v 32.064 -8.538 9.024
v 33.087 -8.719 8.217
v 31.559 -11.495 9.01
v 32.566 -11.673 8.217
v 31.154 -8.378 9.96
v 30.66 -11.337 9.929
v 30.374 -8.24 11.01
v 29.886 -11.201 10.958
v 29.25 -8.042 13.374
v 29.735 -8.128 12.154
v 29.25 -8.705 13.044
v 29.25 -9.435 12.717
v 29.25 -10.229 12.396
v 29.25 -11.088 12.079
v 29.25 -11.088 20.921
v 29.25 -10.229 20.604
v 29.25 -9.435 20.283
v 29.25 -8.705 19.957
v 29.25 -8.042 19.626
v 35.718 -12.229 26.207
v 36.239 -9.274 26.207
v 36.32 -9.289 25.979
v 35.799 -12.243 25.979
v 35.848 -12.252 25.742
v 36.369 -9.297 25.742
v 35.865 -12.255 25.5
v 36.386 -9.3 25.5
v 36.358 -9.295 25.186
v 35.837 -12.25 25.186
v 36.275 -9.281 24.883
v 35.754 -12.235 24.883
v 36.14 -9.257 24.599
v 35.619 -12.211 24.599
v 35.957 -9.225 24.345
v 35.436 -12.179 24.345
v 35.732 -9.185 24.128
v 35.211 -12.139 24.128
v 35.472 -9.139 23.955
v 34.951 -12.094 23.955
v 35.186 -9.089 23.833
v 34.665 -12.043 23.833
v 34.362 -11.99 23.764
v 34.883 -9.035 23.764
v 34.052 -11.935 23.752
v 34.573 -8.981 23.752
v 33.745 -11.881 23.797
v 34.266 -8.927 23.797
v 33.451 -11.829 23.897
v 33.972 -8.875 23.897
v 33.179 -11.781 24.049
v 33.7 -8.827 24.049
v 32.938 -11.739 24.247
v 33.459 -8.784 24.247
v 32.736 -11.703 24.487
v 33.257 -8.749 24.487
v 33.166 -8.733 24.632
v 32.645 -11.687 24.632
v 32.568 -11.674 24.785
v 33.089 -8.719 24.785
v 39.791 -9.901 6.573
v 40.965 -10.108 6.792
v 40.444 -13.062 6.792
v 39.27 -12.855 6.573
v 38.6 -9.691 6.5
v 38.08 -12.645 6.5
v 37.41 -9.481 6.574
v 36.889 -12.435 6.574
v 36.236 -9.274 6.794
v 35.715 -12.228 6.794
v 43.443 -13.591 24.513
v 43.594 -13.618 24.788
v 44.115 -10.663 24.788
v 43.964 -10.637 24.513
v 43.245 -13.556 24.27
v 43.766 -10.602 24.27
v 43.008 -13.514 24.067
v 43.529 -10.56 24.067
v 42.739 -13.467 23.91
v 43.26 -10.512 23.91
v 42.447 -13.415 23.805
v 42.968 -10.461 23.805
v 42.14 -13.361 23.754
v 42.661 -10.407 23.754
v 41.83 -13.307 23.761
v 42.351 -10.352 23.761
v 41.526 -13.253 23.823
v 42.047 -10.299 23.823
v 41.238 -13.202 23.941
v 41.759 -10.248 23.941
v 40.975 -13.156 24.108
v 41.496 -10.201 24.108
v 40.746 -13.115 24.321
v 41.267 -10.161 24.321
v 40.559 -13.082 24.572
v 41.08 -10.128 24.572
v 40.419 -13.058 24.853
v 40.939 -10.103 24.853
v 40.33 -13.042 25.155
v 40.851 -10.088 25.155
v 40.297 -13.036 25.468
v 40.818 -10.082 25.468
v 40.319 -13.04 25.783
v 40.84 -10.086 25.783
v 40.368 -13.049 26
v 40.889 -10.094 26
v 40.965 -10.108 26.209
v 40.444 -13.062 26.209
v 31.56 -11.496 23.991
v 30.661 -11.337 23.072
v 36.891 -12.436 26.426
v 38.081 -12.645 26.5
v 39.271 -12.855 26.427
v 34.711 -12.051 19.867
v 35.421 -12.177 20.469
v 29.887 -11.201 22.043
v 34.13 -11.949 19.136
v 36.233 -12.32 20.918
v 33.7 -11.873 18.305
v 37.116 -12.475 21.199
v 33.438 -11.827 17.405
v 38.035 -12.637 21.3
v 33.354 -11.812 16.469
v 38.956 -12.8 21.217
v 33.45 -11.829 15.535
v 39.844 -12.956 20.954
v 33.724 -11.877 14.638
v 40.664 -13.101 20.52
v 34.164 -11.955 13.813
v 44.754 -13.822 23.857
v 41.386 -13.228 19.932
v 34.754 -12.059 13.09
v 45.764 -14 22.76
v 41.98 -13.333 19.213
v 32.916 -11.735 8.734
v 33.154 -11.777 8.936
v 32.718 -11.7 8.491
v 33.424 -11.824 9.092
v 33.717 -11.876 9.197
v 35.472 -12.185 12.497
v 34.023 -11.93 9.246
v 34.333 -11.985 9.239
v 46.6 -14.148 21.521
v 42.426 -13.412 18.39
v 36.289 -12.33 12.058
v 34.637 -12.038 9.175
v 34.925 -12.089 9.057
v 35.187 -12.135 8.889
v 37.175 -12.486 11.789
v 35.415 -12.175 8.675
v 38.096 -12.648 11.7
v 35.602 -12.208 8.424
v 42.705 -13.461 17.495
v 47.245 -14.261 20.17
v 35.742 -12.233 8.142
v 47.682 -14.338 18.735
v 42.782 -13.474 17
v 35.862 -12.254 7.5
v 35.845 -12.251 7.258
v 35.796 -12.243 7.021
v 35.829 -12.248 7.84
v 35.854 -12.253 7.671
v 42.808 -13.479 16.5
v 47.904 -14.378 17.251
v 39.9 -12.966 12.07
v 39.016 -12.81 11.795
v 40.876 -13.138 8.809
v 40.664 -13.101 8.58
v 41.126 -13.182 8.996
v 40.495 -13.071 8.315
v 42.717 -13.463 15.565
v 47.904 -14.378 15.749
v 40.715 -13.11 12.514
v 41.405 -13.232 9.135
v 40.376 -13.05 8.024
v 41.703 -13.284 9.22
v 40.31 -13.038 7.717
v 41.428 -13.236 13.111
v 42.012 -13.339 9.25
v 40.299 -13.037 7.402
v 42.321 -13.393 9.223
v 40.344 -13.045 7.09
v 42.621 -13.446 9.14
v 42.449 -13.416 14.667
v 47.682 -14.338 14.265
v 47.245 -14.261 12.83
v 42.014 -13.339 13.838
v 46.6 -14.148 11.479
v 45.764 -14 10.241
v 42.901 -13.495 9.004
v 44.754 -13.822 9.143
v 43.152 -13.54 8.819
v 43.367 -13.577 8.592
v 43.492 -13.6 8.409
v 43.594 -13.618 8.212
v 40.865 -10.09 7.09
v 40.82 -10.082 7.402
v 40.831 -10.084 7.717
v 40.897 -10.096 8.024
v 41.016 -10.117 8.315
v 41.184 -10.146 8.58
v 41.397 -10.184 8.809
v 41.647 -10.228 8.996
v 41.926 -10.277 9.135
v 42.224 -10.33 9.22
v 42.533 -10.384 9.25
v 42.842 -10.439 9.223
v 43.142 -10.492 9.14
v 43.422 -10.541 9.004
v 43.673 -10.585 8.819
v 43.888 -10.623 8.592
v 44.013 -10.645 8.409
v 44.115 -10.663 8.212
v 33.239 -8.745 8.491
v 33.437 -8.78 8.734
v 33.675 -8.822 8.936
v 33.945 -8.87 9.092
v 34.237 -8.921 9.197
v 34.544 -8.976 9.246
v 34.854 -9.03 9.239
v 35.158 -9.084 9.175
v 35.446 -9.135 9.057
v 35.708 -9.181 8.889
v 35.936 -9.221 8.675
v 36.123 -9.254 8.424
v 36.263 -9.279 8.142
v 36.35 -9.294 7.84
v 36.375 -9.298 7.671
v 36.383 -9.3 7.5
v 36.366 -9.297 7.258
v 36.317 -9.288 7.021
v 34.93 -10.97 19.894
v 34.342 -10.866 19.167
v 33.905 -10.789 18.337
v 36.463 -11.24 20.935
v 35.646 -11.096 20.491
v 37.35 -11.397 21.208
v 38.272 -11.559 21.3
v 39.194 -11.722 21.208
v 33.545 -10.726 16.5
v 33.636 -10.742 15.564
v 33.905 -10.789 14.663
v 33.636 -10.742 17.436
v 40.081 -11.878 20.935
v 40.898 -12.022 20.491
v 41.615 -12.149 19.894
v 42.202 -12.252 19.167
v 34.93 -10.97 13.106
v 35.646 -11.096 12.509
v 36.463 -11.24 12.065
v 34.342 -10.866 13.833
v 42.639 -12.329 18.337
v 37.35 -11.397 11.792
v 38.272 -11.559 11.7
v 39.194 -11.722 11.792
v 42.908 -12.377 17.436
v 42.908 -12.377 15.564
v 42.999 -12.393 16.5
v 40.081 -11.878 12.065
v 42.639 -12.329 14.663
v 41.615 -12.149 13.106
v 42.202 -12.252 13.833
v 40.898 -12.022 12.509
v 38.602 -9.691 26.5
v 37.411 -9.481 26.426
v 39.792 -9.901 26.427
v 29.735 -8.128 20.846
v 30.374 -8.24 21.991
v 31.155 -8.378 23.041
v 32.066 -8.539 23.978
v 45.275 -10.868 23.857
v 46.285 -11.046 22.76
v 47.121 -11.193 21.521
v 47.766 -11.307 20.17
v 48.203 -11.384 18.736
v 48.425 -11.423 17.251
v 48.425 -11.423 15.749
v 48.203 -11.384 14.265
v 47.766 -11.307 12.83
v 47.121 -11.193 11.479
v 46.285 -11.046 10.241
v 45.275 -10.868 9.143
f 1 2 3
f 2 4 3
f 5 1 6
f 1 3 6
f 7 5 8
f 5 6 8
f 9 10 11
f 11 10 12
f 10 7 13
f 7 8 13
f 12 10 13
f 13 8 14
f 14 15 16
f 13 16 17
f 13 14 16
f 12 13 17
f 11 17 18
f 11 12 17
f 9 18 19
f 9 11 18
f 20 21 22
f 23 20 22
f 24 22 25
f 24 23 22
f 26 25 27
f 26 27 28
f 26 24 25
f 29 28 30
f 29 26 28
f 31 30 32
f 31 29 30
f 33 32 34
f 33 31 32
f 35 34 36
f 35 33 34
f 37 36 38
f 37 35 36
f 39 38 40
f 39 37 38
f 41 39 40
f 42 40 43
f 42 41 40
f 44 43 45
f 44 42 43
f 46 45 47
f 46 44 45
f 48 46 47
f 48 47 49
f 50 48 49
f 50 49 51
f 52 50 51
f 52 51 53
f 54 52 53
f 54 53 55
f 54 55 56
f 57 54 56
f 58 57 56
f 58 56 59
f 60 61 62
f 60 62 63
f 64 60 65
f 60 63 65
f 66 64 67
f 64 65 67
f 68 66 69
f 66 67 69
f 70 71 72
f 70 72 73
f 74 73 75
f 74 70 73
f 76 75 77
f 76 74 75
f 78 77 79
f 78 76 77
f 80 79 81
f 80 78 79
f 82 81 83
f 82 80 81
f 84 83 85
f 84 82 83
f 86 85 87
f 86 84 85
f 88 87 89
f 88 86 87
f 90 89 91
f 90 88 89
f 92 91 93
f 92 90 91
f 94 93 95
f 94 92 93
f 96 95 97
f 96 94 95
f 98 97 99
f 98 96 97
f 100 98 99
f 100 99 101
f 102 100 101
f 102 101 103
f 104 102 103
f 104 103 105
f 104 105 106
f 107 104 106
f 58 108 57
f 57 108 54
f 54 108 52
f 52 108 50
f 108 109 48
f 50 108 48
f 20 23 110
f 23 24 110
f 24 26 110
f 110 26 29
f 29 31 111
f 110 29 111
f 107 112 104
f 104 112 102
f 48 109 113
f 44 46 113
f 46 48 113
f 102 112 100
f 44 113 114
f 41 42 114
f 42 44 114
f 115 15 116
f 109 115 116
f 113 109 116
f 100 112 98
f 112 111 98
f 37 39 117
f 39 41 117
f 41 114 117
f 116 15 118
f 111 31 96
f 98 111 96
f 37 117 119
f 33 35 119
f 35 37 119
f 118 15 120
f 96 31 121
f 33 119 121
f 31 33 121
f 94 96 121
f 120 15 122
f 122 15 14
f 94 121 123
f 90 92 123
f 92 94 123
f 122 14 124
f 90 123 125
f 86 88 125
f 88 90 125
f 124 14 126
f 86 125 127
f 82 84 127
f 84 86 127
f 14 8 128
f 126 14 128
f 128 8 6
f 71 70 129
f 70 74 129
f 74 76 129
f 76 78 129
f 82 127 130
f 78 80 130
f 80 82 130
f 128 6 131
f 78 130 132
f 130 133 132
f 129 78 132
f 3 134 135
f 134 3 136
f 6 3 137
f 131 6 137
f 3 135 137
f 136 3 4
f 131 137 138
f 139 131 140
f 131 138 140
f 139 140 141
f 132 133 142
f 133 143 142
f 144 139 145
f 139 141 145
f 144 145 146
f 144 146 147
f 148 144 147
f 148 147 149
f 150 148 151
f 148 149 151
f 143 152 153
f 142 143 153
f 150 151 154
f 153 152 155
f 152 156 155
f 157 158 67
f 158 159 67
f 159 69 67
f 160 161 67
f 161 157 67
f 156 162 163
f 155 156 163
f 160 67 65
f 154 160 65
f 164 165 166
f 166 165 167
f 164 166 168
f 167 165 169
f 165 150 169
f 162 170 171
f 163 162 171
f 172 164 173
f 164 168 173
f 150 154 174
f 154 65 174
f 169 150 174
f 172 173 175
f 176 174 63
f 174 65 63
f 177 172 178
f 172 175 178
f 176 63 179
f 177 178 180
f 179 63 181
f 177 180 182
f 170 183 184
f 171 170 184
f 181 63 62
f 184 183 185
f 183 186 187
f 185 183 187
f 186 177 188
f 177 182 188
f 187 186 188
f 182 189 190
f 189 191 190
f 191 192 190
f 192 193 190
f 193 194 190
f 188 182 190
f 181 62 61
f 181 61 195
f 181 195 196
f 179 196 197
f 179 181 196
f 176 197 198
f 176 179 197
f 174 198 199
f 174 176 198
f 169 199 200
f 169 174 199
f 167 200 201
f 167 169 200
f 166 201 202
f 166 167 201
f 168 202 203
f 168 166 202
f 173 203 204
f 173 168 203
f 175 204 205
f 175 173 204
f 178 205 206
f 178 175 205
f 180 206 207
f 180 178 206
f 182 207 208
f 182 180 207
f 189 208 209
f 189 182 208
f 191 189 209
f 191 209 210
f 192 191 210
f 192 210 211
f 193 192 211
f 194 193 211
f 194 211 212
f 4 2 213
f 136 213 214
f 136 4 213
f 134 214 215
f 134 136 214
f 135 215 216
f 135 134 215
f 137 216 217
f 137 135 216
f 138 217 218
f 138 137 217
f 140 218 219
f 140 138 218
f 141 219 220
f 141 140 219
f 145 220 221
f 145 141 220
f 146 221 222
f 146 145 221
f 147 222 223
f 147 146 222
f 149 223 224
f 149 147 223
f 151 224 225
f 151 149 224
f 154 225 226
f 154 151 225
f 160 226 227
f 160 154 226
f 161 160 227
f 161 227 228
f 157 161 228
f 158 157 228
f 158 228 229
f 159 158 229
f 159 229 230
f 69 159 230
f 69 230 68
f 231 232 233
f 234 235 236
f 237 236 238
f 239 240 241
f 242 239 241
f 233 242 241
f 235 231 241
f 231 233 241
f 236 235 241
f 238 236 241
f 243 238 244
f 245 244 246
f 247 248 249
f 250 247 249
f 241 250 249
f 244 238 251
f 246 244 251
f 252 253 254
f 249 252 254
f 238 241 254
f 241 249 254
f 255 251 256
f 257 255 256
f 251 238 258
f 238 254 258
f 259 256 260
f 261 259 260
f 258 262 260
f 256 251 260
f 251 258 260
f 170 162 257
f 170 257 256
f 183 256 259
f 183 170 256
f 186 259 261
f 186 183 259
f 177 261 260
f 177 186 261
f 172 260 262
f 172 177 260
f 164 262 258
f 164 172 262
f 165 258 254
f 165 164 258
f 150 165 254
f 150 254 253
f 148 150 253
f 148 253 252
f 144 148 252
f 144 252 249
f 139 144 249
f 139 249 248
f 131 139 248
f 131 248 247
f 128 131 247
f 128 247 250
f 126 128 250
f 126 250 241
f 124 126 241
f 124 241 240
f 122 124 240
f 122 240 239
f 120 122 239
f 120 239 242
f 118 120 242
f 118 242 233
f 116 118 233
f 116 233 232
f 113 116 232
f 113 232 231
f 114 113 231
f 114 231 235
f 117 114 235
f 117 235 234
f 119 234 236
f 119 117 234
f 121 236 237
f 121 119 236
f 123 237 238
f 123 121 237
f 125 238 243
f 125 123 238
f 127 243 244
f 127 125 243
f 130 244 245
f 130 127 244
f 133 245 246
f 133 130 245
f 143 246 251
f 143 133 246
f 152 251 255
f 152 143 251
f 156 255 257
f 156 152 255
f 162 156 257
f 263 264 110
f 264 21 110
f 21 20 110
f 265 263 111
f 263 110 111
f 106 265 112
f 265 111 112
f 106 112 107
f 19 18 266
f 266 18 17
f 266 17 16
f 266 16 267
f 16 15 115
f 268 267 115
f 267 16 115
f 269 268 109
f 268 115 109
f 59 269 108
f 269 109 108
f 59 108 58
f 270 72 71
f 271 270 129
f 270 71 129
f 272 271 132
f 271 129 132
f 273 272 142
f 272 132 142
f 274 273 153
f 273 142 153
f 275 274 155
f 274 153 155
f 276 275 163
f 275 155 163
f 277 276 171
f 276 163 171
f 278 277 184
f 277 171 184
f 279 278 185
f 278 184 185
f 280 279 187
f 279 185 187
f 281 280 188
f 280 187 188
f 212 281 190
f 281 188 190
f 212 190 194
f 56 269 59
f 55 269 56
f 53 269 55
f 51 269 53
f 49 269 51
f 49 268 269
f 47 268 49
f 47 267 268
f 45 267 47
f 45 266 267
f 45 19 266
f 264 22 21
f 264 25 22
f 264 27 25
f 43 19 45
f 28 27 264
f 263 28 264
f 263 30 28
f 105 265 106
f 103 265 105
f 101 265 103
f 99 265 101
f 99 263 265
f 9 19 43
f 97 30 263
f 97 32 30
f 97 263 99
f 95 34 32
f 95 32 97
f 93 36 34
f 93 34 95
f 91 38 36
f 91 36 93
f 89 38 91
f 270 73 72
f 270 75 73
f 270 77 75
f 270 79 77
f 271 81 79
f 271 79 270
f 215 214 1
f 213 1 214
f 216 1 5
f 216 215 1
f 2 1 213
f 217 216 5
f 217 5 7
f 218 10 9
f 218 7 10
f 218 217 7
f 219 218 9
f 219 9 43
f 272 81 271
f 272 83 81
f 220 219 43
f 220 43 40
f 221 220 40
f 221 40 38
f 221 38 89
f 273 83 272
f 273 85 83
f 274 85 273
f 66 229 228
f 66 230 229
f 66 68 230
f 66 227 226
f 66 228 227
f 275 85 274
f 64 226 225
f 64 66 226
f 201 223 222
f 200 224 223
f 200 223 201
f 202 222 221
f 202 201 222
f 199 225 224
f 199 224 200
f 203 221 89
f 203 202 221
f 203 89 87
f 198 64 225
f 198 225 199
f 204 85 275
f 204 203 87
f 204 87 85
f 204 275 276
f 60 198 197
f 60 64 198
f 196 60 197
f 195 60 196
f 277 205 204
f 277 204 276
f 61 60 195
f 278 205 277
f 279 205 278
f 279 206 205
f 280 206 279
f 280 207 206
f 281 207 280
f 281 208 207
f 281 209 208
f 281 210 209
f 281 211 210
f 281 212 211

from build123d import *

# Parameters (mm, degrees)
CYLINDER064_R               = 4.8
CYLINDER064_DEPTH           = 18
CYLINDER064_ROLL_ANGLE      = -89.999776
CYLINDER064_PITCH_ANGLE     = 1.4e-05
CYLINDER064_PLACEMENT_ANGLE = -9.999925
PAD011_DEPTH                = 47
CYLINDER051_R               = 1.75
CYLINDER051_DEPTH           = 18
CYLINDER051_ROLL_ANGLE      = -89.999776
CYLINDER051_PITCH_ANGLE     = 1.4e-05
CYLINDER051_PLACEMENT_ANGLE = -9.999925
CYLINDER053_R               = 1.75
CYLINDER053_DEPTH           = 18
CYLINDER053_ROLL_ANGLE      = -89.999776
CYLINDER053_PITCH_ANGLE     = 1.4e-05
CYLINDER053_PLACEMENT_ANGLE = -9.999925
CYLINDER054_R               = 1.75
CYLINDER054_DEPTH           = 18
CYLINDER054_ROLL_ANGLE      = -89.999776
CYLINDER054_PITCH_ANGLE     = 1.4e-05
CYLINDER054_PLACEMENT_ANGLE = -9.999925
CYLINDER059_R               = 1.75
CYLINDER059_DEPTH           = 18
CYLINDER059_ROLL_ANGLE      = -89.999776
CYLINDER059_PITCH_ANGLE     = 1.4e-05
CYLINDER059_PLACEMENT_ANGLE = -9.999925
CYLINDER055_R               = 10
CYLINDER055_DEPTH           = 3
CYLINDER055_ROLL_ANGLE      = -89.999807
CYLINDER055_PITCH_ANGLE     = 8e-06
CYLINDER055_PLACEMENT_ANGLE = -9.999933


with BuildPart() as cylinder064:
    # Cylinder064 → Cylinder064 (new body)
    with BuildSketch(Plane.XY):
        Circle(CYLINDER064_R)
    extrude(amount=CYLINDER064_DEPTH)


with BuildPart() as cylinder064_1:
    # Cylinder064 roll: moved
    add(cylinder064.part.rotate(Axis((0, 0, 0), (1, 0, 0)), CYLINDER064_ROLL_ANGLE))


with BuildPart() as cylinder064_2:
    # Cylinder064 pitch: moved
    add(cylinder064_1.part.rotate(Axis((0, 0, 0), (0, 1, 0)), CYLINDER064_PITCH_ANGLE))


with BuildPart() as cylinder064_3:
    # Cylinder064 placement: moved
    add(cylinder064_2.part.moved(Location((35.146424, -29.285947, 16.499989))).rotate(Axis((35.146424, -29.285947, 16.499989), (0, 0, 1)), CYLINDER064_PLACEMENT_ANGLE))


with BuildPart() as winkel_p001:
    # Sketch011 → Pad011 (new body)
    with BuildSketch(Plane.XY):
        Polygon((29.25, 0), (25.25, 0), (25.25, -28), (44.946155, -31.472964), (45.640748, -27.533733), (29.25, -24.643601), align=None)
    extrude(amount=PAD011_DEPTH)


with BuildPart() as winkel_p001_1:
    # Body013 placement: moved
    add(winkel_p001.part.moved(Location((0, 0, -7))))


with BuildPart() as cylinder051:
    # Cylinder051 → Cylinder051 (new body)
    with BuildSketch(Plane.XY):
        Circle(CYLINDER051_R)
    extrude(amount=CYLINDER051_DEPTH)


with BuildPart() as cylinder051_1:
    # Cylinder051 roll: moved
    add(cylinder051.part.rotate(Axis((0, 0, 0), (1, 0, 0)), CYLINDER051_ROLL_ANGLE))


with BuildPart() as cylinder051_2:
    # Cylinder051 pitch: moved
    add(cylinder051_1.part.rotate(Axis((0, 0, 0), (0, 1, 0)), CYLINDER051_PITCH_ANGLE))


with BuildPart() as cylinder051_3:
    # Cylinder051 placement: moved
    add(cylinder051_2.part.moved(Location((32.058057, -23.765835, 25.500009))).rotate(Axis((32.058057, -23.765835, 25.500009), (0, 0, 1)), CYLINDER051_PLACEMENT_ANGLE))


with BuildPart() as cylinder053:
    # Cylinder053 → Cylinder053 (new body)
    with BuildSketch(Plane.XY):
        Circle(CYLINDER053_R)
    extrude(amount=CYLINDER053_DEPTH)


with BuildPart() as cylinder053_1:
    # Cylinder053 roll: moved
    add(cylinder053.part.rotate(Axis((0, 0, 0), (1, 0, 0)), CYLINDER053_ROLL_ANGLE))


with BuildPart() as cylinder053_2:
    # Cylinder053 pitch: moved
    add(cylinder053_1.part.rotate(Axis((0, 0, 0), (0, 1, 0)), CYLINDER053_PITCH_ANGLE))


with BuildPart() as cylinder053_3:
    # Cylinder053 placement: moved
    add(cylinder053_2.part.moved(Location((39.936521, -25.15501, 25.500007))).rotate(Axis((39.936521, -25.15501, 25.500007), (0, 0, 1)), CYLINDER053_PLACEMENT_ANGLE))


with BuildPart() as cylinder054:
    # Cylinder054 → Cylinder054 (new body)
    with BuildSketch(Plane.XY):
        Circle(CYLINDER054_R)
    extrude(amount=CYLINDER054_DEPTH)


with BuildPart() as cylinder054_1:
    # Cylinder054 roll: moved
    add(cylinder054.part.rotate(Axis((0, 0, 0), (1, 0, 0)), CYLINDER054_ROLL_ANGLE))


with BuildPart() as cylinder054_2:
    # Cylinder054 pitch: moved
    add(cylinder054_1.part.rotate(Axis((0, 0, 0), (0, 1, 0)), CYLINDER054_PITCH_ANGLE))


with BuildPart() as cylinder054_3:
    # Cylinder054 placement: moved
    add(cylinder054_2.part.moved(Location((32.055183, -23.766017, 7.500006))).rotate(Axis((32.055183, -23.766017, 7.500006), (0, 0, 1)), CYLINDER054_PLACEMENT_ANGLE))


with BuildPart() as cylinder059:
    # Cylinder059 → Cylinder059 (new body)
    with BuildSketch(Plane.XY):
        Circle(CYLINDER059_R)
    extrude(amount=CYLINDER059_DEPTH)


with BuildPart() as cylinder059_1:
    # Cylinder059 roll: moved
    add(cylinder059.part.rotate(Axis((0, 0, 0), (1, 0, 0)), CYLINDER059_ROLL_ANGLE))


with BuildPart() as cylinder059_2:
    # Cylinder059 pitch: moved
    add(cylinder059_1.part.rotate(Axis((0, 0, 0), (0, 1, 0)), CYLINDER059_PITCH_ANGLE))


with BuildPart() as cylinder059_3:
    # Cylinder059 placement: moved
    add(cylinder059_2.part.moved(Location((39.936529, -25.15494, 7.500007))).rotate(Axis((39.936529, -25.15494, 7.500007), (0, 0, 1)), CYLINDER059_PLACEMENT_ANGLE))


with BuildPart() as cut061:
    # Cylinder055 → Cylinder055 (new body)
    with BuildSketch(Plane.XY):
        Circle(CYLINDER055_R)
    extrude(amount=CYLINDER055_DEPTH)


with BuildPart() as cut061_1:
    # Cylinder055 roll: moved
    add(cut061.part.rotate(Axis((0, 0, 0), (1, 0, 0)), CYLINDER055_ROLL_ANGLE))


with BuildPart() as cut061_2:
    # Cylinder055 pitch: moved
    add(cut061_1.part.rotate(Axis((0, 0, 0), (0, 1, 0)), CYLINDER055_PITCH_ANGLE))


with BuildPart() as cut061_3:
    # Cylinder055 placement: moved
    add(cut061_2.part.moved(Location((38.083572, -12.645952, 16.50004))).rotate(Axis((38.083572, -12.645952, 16.50004), (0, 0, 1)), CYLINDER055_PLACEMENT_ANGLE))

    # Cut053: cut Cylinder059
    add(cylinder059_3.part, mode=Mode.SUBTRACT)

    # Cut054: cut Cylinder054
    add(cylinder054_3.part, mode=Mode.SUBTRACT)

    # Cut055: cut Cylinder053
    add(cylinder053_3.part, mode=Mode.SUBTRACT)

    # Cut056: cut Cylinder051
    add(cylinder051_3.part, mode=Mode.SUBTRACT)

    # Cut057: cut winkel_p001
    add(winkel_p001_1.part, mode=Mode.SUBTRACT)

    # Cut061: cut Cylinder064
    add(cylinder064_3.part, mode=Mode.SUBTRACT)


solid = cut061_3.part
